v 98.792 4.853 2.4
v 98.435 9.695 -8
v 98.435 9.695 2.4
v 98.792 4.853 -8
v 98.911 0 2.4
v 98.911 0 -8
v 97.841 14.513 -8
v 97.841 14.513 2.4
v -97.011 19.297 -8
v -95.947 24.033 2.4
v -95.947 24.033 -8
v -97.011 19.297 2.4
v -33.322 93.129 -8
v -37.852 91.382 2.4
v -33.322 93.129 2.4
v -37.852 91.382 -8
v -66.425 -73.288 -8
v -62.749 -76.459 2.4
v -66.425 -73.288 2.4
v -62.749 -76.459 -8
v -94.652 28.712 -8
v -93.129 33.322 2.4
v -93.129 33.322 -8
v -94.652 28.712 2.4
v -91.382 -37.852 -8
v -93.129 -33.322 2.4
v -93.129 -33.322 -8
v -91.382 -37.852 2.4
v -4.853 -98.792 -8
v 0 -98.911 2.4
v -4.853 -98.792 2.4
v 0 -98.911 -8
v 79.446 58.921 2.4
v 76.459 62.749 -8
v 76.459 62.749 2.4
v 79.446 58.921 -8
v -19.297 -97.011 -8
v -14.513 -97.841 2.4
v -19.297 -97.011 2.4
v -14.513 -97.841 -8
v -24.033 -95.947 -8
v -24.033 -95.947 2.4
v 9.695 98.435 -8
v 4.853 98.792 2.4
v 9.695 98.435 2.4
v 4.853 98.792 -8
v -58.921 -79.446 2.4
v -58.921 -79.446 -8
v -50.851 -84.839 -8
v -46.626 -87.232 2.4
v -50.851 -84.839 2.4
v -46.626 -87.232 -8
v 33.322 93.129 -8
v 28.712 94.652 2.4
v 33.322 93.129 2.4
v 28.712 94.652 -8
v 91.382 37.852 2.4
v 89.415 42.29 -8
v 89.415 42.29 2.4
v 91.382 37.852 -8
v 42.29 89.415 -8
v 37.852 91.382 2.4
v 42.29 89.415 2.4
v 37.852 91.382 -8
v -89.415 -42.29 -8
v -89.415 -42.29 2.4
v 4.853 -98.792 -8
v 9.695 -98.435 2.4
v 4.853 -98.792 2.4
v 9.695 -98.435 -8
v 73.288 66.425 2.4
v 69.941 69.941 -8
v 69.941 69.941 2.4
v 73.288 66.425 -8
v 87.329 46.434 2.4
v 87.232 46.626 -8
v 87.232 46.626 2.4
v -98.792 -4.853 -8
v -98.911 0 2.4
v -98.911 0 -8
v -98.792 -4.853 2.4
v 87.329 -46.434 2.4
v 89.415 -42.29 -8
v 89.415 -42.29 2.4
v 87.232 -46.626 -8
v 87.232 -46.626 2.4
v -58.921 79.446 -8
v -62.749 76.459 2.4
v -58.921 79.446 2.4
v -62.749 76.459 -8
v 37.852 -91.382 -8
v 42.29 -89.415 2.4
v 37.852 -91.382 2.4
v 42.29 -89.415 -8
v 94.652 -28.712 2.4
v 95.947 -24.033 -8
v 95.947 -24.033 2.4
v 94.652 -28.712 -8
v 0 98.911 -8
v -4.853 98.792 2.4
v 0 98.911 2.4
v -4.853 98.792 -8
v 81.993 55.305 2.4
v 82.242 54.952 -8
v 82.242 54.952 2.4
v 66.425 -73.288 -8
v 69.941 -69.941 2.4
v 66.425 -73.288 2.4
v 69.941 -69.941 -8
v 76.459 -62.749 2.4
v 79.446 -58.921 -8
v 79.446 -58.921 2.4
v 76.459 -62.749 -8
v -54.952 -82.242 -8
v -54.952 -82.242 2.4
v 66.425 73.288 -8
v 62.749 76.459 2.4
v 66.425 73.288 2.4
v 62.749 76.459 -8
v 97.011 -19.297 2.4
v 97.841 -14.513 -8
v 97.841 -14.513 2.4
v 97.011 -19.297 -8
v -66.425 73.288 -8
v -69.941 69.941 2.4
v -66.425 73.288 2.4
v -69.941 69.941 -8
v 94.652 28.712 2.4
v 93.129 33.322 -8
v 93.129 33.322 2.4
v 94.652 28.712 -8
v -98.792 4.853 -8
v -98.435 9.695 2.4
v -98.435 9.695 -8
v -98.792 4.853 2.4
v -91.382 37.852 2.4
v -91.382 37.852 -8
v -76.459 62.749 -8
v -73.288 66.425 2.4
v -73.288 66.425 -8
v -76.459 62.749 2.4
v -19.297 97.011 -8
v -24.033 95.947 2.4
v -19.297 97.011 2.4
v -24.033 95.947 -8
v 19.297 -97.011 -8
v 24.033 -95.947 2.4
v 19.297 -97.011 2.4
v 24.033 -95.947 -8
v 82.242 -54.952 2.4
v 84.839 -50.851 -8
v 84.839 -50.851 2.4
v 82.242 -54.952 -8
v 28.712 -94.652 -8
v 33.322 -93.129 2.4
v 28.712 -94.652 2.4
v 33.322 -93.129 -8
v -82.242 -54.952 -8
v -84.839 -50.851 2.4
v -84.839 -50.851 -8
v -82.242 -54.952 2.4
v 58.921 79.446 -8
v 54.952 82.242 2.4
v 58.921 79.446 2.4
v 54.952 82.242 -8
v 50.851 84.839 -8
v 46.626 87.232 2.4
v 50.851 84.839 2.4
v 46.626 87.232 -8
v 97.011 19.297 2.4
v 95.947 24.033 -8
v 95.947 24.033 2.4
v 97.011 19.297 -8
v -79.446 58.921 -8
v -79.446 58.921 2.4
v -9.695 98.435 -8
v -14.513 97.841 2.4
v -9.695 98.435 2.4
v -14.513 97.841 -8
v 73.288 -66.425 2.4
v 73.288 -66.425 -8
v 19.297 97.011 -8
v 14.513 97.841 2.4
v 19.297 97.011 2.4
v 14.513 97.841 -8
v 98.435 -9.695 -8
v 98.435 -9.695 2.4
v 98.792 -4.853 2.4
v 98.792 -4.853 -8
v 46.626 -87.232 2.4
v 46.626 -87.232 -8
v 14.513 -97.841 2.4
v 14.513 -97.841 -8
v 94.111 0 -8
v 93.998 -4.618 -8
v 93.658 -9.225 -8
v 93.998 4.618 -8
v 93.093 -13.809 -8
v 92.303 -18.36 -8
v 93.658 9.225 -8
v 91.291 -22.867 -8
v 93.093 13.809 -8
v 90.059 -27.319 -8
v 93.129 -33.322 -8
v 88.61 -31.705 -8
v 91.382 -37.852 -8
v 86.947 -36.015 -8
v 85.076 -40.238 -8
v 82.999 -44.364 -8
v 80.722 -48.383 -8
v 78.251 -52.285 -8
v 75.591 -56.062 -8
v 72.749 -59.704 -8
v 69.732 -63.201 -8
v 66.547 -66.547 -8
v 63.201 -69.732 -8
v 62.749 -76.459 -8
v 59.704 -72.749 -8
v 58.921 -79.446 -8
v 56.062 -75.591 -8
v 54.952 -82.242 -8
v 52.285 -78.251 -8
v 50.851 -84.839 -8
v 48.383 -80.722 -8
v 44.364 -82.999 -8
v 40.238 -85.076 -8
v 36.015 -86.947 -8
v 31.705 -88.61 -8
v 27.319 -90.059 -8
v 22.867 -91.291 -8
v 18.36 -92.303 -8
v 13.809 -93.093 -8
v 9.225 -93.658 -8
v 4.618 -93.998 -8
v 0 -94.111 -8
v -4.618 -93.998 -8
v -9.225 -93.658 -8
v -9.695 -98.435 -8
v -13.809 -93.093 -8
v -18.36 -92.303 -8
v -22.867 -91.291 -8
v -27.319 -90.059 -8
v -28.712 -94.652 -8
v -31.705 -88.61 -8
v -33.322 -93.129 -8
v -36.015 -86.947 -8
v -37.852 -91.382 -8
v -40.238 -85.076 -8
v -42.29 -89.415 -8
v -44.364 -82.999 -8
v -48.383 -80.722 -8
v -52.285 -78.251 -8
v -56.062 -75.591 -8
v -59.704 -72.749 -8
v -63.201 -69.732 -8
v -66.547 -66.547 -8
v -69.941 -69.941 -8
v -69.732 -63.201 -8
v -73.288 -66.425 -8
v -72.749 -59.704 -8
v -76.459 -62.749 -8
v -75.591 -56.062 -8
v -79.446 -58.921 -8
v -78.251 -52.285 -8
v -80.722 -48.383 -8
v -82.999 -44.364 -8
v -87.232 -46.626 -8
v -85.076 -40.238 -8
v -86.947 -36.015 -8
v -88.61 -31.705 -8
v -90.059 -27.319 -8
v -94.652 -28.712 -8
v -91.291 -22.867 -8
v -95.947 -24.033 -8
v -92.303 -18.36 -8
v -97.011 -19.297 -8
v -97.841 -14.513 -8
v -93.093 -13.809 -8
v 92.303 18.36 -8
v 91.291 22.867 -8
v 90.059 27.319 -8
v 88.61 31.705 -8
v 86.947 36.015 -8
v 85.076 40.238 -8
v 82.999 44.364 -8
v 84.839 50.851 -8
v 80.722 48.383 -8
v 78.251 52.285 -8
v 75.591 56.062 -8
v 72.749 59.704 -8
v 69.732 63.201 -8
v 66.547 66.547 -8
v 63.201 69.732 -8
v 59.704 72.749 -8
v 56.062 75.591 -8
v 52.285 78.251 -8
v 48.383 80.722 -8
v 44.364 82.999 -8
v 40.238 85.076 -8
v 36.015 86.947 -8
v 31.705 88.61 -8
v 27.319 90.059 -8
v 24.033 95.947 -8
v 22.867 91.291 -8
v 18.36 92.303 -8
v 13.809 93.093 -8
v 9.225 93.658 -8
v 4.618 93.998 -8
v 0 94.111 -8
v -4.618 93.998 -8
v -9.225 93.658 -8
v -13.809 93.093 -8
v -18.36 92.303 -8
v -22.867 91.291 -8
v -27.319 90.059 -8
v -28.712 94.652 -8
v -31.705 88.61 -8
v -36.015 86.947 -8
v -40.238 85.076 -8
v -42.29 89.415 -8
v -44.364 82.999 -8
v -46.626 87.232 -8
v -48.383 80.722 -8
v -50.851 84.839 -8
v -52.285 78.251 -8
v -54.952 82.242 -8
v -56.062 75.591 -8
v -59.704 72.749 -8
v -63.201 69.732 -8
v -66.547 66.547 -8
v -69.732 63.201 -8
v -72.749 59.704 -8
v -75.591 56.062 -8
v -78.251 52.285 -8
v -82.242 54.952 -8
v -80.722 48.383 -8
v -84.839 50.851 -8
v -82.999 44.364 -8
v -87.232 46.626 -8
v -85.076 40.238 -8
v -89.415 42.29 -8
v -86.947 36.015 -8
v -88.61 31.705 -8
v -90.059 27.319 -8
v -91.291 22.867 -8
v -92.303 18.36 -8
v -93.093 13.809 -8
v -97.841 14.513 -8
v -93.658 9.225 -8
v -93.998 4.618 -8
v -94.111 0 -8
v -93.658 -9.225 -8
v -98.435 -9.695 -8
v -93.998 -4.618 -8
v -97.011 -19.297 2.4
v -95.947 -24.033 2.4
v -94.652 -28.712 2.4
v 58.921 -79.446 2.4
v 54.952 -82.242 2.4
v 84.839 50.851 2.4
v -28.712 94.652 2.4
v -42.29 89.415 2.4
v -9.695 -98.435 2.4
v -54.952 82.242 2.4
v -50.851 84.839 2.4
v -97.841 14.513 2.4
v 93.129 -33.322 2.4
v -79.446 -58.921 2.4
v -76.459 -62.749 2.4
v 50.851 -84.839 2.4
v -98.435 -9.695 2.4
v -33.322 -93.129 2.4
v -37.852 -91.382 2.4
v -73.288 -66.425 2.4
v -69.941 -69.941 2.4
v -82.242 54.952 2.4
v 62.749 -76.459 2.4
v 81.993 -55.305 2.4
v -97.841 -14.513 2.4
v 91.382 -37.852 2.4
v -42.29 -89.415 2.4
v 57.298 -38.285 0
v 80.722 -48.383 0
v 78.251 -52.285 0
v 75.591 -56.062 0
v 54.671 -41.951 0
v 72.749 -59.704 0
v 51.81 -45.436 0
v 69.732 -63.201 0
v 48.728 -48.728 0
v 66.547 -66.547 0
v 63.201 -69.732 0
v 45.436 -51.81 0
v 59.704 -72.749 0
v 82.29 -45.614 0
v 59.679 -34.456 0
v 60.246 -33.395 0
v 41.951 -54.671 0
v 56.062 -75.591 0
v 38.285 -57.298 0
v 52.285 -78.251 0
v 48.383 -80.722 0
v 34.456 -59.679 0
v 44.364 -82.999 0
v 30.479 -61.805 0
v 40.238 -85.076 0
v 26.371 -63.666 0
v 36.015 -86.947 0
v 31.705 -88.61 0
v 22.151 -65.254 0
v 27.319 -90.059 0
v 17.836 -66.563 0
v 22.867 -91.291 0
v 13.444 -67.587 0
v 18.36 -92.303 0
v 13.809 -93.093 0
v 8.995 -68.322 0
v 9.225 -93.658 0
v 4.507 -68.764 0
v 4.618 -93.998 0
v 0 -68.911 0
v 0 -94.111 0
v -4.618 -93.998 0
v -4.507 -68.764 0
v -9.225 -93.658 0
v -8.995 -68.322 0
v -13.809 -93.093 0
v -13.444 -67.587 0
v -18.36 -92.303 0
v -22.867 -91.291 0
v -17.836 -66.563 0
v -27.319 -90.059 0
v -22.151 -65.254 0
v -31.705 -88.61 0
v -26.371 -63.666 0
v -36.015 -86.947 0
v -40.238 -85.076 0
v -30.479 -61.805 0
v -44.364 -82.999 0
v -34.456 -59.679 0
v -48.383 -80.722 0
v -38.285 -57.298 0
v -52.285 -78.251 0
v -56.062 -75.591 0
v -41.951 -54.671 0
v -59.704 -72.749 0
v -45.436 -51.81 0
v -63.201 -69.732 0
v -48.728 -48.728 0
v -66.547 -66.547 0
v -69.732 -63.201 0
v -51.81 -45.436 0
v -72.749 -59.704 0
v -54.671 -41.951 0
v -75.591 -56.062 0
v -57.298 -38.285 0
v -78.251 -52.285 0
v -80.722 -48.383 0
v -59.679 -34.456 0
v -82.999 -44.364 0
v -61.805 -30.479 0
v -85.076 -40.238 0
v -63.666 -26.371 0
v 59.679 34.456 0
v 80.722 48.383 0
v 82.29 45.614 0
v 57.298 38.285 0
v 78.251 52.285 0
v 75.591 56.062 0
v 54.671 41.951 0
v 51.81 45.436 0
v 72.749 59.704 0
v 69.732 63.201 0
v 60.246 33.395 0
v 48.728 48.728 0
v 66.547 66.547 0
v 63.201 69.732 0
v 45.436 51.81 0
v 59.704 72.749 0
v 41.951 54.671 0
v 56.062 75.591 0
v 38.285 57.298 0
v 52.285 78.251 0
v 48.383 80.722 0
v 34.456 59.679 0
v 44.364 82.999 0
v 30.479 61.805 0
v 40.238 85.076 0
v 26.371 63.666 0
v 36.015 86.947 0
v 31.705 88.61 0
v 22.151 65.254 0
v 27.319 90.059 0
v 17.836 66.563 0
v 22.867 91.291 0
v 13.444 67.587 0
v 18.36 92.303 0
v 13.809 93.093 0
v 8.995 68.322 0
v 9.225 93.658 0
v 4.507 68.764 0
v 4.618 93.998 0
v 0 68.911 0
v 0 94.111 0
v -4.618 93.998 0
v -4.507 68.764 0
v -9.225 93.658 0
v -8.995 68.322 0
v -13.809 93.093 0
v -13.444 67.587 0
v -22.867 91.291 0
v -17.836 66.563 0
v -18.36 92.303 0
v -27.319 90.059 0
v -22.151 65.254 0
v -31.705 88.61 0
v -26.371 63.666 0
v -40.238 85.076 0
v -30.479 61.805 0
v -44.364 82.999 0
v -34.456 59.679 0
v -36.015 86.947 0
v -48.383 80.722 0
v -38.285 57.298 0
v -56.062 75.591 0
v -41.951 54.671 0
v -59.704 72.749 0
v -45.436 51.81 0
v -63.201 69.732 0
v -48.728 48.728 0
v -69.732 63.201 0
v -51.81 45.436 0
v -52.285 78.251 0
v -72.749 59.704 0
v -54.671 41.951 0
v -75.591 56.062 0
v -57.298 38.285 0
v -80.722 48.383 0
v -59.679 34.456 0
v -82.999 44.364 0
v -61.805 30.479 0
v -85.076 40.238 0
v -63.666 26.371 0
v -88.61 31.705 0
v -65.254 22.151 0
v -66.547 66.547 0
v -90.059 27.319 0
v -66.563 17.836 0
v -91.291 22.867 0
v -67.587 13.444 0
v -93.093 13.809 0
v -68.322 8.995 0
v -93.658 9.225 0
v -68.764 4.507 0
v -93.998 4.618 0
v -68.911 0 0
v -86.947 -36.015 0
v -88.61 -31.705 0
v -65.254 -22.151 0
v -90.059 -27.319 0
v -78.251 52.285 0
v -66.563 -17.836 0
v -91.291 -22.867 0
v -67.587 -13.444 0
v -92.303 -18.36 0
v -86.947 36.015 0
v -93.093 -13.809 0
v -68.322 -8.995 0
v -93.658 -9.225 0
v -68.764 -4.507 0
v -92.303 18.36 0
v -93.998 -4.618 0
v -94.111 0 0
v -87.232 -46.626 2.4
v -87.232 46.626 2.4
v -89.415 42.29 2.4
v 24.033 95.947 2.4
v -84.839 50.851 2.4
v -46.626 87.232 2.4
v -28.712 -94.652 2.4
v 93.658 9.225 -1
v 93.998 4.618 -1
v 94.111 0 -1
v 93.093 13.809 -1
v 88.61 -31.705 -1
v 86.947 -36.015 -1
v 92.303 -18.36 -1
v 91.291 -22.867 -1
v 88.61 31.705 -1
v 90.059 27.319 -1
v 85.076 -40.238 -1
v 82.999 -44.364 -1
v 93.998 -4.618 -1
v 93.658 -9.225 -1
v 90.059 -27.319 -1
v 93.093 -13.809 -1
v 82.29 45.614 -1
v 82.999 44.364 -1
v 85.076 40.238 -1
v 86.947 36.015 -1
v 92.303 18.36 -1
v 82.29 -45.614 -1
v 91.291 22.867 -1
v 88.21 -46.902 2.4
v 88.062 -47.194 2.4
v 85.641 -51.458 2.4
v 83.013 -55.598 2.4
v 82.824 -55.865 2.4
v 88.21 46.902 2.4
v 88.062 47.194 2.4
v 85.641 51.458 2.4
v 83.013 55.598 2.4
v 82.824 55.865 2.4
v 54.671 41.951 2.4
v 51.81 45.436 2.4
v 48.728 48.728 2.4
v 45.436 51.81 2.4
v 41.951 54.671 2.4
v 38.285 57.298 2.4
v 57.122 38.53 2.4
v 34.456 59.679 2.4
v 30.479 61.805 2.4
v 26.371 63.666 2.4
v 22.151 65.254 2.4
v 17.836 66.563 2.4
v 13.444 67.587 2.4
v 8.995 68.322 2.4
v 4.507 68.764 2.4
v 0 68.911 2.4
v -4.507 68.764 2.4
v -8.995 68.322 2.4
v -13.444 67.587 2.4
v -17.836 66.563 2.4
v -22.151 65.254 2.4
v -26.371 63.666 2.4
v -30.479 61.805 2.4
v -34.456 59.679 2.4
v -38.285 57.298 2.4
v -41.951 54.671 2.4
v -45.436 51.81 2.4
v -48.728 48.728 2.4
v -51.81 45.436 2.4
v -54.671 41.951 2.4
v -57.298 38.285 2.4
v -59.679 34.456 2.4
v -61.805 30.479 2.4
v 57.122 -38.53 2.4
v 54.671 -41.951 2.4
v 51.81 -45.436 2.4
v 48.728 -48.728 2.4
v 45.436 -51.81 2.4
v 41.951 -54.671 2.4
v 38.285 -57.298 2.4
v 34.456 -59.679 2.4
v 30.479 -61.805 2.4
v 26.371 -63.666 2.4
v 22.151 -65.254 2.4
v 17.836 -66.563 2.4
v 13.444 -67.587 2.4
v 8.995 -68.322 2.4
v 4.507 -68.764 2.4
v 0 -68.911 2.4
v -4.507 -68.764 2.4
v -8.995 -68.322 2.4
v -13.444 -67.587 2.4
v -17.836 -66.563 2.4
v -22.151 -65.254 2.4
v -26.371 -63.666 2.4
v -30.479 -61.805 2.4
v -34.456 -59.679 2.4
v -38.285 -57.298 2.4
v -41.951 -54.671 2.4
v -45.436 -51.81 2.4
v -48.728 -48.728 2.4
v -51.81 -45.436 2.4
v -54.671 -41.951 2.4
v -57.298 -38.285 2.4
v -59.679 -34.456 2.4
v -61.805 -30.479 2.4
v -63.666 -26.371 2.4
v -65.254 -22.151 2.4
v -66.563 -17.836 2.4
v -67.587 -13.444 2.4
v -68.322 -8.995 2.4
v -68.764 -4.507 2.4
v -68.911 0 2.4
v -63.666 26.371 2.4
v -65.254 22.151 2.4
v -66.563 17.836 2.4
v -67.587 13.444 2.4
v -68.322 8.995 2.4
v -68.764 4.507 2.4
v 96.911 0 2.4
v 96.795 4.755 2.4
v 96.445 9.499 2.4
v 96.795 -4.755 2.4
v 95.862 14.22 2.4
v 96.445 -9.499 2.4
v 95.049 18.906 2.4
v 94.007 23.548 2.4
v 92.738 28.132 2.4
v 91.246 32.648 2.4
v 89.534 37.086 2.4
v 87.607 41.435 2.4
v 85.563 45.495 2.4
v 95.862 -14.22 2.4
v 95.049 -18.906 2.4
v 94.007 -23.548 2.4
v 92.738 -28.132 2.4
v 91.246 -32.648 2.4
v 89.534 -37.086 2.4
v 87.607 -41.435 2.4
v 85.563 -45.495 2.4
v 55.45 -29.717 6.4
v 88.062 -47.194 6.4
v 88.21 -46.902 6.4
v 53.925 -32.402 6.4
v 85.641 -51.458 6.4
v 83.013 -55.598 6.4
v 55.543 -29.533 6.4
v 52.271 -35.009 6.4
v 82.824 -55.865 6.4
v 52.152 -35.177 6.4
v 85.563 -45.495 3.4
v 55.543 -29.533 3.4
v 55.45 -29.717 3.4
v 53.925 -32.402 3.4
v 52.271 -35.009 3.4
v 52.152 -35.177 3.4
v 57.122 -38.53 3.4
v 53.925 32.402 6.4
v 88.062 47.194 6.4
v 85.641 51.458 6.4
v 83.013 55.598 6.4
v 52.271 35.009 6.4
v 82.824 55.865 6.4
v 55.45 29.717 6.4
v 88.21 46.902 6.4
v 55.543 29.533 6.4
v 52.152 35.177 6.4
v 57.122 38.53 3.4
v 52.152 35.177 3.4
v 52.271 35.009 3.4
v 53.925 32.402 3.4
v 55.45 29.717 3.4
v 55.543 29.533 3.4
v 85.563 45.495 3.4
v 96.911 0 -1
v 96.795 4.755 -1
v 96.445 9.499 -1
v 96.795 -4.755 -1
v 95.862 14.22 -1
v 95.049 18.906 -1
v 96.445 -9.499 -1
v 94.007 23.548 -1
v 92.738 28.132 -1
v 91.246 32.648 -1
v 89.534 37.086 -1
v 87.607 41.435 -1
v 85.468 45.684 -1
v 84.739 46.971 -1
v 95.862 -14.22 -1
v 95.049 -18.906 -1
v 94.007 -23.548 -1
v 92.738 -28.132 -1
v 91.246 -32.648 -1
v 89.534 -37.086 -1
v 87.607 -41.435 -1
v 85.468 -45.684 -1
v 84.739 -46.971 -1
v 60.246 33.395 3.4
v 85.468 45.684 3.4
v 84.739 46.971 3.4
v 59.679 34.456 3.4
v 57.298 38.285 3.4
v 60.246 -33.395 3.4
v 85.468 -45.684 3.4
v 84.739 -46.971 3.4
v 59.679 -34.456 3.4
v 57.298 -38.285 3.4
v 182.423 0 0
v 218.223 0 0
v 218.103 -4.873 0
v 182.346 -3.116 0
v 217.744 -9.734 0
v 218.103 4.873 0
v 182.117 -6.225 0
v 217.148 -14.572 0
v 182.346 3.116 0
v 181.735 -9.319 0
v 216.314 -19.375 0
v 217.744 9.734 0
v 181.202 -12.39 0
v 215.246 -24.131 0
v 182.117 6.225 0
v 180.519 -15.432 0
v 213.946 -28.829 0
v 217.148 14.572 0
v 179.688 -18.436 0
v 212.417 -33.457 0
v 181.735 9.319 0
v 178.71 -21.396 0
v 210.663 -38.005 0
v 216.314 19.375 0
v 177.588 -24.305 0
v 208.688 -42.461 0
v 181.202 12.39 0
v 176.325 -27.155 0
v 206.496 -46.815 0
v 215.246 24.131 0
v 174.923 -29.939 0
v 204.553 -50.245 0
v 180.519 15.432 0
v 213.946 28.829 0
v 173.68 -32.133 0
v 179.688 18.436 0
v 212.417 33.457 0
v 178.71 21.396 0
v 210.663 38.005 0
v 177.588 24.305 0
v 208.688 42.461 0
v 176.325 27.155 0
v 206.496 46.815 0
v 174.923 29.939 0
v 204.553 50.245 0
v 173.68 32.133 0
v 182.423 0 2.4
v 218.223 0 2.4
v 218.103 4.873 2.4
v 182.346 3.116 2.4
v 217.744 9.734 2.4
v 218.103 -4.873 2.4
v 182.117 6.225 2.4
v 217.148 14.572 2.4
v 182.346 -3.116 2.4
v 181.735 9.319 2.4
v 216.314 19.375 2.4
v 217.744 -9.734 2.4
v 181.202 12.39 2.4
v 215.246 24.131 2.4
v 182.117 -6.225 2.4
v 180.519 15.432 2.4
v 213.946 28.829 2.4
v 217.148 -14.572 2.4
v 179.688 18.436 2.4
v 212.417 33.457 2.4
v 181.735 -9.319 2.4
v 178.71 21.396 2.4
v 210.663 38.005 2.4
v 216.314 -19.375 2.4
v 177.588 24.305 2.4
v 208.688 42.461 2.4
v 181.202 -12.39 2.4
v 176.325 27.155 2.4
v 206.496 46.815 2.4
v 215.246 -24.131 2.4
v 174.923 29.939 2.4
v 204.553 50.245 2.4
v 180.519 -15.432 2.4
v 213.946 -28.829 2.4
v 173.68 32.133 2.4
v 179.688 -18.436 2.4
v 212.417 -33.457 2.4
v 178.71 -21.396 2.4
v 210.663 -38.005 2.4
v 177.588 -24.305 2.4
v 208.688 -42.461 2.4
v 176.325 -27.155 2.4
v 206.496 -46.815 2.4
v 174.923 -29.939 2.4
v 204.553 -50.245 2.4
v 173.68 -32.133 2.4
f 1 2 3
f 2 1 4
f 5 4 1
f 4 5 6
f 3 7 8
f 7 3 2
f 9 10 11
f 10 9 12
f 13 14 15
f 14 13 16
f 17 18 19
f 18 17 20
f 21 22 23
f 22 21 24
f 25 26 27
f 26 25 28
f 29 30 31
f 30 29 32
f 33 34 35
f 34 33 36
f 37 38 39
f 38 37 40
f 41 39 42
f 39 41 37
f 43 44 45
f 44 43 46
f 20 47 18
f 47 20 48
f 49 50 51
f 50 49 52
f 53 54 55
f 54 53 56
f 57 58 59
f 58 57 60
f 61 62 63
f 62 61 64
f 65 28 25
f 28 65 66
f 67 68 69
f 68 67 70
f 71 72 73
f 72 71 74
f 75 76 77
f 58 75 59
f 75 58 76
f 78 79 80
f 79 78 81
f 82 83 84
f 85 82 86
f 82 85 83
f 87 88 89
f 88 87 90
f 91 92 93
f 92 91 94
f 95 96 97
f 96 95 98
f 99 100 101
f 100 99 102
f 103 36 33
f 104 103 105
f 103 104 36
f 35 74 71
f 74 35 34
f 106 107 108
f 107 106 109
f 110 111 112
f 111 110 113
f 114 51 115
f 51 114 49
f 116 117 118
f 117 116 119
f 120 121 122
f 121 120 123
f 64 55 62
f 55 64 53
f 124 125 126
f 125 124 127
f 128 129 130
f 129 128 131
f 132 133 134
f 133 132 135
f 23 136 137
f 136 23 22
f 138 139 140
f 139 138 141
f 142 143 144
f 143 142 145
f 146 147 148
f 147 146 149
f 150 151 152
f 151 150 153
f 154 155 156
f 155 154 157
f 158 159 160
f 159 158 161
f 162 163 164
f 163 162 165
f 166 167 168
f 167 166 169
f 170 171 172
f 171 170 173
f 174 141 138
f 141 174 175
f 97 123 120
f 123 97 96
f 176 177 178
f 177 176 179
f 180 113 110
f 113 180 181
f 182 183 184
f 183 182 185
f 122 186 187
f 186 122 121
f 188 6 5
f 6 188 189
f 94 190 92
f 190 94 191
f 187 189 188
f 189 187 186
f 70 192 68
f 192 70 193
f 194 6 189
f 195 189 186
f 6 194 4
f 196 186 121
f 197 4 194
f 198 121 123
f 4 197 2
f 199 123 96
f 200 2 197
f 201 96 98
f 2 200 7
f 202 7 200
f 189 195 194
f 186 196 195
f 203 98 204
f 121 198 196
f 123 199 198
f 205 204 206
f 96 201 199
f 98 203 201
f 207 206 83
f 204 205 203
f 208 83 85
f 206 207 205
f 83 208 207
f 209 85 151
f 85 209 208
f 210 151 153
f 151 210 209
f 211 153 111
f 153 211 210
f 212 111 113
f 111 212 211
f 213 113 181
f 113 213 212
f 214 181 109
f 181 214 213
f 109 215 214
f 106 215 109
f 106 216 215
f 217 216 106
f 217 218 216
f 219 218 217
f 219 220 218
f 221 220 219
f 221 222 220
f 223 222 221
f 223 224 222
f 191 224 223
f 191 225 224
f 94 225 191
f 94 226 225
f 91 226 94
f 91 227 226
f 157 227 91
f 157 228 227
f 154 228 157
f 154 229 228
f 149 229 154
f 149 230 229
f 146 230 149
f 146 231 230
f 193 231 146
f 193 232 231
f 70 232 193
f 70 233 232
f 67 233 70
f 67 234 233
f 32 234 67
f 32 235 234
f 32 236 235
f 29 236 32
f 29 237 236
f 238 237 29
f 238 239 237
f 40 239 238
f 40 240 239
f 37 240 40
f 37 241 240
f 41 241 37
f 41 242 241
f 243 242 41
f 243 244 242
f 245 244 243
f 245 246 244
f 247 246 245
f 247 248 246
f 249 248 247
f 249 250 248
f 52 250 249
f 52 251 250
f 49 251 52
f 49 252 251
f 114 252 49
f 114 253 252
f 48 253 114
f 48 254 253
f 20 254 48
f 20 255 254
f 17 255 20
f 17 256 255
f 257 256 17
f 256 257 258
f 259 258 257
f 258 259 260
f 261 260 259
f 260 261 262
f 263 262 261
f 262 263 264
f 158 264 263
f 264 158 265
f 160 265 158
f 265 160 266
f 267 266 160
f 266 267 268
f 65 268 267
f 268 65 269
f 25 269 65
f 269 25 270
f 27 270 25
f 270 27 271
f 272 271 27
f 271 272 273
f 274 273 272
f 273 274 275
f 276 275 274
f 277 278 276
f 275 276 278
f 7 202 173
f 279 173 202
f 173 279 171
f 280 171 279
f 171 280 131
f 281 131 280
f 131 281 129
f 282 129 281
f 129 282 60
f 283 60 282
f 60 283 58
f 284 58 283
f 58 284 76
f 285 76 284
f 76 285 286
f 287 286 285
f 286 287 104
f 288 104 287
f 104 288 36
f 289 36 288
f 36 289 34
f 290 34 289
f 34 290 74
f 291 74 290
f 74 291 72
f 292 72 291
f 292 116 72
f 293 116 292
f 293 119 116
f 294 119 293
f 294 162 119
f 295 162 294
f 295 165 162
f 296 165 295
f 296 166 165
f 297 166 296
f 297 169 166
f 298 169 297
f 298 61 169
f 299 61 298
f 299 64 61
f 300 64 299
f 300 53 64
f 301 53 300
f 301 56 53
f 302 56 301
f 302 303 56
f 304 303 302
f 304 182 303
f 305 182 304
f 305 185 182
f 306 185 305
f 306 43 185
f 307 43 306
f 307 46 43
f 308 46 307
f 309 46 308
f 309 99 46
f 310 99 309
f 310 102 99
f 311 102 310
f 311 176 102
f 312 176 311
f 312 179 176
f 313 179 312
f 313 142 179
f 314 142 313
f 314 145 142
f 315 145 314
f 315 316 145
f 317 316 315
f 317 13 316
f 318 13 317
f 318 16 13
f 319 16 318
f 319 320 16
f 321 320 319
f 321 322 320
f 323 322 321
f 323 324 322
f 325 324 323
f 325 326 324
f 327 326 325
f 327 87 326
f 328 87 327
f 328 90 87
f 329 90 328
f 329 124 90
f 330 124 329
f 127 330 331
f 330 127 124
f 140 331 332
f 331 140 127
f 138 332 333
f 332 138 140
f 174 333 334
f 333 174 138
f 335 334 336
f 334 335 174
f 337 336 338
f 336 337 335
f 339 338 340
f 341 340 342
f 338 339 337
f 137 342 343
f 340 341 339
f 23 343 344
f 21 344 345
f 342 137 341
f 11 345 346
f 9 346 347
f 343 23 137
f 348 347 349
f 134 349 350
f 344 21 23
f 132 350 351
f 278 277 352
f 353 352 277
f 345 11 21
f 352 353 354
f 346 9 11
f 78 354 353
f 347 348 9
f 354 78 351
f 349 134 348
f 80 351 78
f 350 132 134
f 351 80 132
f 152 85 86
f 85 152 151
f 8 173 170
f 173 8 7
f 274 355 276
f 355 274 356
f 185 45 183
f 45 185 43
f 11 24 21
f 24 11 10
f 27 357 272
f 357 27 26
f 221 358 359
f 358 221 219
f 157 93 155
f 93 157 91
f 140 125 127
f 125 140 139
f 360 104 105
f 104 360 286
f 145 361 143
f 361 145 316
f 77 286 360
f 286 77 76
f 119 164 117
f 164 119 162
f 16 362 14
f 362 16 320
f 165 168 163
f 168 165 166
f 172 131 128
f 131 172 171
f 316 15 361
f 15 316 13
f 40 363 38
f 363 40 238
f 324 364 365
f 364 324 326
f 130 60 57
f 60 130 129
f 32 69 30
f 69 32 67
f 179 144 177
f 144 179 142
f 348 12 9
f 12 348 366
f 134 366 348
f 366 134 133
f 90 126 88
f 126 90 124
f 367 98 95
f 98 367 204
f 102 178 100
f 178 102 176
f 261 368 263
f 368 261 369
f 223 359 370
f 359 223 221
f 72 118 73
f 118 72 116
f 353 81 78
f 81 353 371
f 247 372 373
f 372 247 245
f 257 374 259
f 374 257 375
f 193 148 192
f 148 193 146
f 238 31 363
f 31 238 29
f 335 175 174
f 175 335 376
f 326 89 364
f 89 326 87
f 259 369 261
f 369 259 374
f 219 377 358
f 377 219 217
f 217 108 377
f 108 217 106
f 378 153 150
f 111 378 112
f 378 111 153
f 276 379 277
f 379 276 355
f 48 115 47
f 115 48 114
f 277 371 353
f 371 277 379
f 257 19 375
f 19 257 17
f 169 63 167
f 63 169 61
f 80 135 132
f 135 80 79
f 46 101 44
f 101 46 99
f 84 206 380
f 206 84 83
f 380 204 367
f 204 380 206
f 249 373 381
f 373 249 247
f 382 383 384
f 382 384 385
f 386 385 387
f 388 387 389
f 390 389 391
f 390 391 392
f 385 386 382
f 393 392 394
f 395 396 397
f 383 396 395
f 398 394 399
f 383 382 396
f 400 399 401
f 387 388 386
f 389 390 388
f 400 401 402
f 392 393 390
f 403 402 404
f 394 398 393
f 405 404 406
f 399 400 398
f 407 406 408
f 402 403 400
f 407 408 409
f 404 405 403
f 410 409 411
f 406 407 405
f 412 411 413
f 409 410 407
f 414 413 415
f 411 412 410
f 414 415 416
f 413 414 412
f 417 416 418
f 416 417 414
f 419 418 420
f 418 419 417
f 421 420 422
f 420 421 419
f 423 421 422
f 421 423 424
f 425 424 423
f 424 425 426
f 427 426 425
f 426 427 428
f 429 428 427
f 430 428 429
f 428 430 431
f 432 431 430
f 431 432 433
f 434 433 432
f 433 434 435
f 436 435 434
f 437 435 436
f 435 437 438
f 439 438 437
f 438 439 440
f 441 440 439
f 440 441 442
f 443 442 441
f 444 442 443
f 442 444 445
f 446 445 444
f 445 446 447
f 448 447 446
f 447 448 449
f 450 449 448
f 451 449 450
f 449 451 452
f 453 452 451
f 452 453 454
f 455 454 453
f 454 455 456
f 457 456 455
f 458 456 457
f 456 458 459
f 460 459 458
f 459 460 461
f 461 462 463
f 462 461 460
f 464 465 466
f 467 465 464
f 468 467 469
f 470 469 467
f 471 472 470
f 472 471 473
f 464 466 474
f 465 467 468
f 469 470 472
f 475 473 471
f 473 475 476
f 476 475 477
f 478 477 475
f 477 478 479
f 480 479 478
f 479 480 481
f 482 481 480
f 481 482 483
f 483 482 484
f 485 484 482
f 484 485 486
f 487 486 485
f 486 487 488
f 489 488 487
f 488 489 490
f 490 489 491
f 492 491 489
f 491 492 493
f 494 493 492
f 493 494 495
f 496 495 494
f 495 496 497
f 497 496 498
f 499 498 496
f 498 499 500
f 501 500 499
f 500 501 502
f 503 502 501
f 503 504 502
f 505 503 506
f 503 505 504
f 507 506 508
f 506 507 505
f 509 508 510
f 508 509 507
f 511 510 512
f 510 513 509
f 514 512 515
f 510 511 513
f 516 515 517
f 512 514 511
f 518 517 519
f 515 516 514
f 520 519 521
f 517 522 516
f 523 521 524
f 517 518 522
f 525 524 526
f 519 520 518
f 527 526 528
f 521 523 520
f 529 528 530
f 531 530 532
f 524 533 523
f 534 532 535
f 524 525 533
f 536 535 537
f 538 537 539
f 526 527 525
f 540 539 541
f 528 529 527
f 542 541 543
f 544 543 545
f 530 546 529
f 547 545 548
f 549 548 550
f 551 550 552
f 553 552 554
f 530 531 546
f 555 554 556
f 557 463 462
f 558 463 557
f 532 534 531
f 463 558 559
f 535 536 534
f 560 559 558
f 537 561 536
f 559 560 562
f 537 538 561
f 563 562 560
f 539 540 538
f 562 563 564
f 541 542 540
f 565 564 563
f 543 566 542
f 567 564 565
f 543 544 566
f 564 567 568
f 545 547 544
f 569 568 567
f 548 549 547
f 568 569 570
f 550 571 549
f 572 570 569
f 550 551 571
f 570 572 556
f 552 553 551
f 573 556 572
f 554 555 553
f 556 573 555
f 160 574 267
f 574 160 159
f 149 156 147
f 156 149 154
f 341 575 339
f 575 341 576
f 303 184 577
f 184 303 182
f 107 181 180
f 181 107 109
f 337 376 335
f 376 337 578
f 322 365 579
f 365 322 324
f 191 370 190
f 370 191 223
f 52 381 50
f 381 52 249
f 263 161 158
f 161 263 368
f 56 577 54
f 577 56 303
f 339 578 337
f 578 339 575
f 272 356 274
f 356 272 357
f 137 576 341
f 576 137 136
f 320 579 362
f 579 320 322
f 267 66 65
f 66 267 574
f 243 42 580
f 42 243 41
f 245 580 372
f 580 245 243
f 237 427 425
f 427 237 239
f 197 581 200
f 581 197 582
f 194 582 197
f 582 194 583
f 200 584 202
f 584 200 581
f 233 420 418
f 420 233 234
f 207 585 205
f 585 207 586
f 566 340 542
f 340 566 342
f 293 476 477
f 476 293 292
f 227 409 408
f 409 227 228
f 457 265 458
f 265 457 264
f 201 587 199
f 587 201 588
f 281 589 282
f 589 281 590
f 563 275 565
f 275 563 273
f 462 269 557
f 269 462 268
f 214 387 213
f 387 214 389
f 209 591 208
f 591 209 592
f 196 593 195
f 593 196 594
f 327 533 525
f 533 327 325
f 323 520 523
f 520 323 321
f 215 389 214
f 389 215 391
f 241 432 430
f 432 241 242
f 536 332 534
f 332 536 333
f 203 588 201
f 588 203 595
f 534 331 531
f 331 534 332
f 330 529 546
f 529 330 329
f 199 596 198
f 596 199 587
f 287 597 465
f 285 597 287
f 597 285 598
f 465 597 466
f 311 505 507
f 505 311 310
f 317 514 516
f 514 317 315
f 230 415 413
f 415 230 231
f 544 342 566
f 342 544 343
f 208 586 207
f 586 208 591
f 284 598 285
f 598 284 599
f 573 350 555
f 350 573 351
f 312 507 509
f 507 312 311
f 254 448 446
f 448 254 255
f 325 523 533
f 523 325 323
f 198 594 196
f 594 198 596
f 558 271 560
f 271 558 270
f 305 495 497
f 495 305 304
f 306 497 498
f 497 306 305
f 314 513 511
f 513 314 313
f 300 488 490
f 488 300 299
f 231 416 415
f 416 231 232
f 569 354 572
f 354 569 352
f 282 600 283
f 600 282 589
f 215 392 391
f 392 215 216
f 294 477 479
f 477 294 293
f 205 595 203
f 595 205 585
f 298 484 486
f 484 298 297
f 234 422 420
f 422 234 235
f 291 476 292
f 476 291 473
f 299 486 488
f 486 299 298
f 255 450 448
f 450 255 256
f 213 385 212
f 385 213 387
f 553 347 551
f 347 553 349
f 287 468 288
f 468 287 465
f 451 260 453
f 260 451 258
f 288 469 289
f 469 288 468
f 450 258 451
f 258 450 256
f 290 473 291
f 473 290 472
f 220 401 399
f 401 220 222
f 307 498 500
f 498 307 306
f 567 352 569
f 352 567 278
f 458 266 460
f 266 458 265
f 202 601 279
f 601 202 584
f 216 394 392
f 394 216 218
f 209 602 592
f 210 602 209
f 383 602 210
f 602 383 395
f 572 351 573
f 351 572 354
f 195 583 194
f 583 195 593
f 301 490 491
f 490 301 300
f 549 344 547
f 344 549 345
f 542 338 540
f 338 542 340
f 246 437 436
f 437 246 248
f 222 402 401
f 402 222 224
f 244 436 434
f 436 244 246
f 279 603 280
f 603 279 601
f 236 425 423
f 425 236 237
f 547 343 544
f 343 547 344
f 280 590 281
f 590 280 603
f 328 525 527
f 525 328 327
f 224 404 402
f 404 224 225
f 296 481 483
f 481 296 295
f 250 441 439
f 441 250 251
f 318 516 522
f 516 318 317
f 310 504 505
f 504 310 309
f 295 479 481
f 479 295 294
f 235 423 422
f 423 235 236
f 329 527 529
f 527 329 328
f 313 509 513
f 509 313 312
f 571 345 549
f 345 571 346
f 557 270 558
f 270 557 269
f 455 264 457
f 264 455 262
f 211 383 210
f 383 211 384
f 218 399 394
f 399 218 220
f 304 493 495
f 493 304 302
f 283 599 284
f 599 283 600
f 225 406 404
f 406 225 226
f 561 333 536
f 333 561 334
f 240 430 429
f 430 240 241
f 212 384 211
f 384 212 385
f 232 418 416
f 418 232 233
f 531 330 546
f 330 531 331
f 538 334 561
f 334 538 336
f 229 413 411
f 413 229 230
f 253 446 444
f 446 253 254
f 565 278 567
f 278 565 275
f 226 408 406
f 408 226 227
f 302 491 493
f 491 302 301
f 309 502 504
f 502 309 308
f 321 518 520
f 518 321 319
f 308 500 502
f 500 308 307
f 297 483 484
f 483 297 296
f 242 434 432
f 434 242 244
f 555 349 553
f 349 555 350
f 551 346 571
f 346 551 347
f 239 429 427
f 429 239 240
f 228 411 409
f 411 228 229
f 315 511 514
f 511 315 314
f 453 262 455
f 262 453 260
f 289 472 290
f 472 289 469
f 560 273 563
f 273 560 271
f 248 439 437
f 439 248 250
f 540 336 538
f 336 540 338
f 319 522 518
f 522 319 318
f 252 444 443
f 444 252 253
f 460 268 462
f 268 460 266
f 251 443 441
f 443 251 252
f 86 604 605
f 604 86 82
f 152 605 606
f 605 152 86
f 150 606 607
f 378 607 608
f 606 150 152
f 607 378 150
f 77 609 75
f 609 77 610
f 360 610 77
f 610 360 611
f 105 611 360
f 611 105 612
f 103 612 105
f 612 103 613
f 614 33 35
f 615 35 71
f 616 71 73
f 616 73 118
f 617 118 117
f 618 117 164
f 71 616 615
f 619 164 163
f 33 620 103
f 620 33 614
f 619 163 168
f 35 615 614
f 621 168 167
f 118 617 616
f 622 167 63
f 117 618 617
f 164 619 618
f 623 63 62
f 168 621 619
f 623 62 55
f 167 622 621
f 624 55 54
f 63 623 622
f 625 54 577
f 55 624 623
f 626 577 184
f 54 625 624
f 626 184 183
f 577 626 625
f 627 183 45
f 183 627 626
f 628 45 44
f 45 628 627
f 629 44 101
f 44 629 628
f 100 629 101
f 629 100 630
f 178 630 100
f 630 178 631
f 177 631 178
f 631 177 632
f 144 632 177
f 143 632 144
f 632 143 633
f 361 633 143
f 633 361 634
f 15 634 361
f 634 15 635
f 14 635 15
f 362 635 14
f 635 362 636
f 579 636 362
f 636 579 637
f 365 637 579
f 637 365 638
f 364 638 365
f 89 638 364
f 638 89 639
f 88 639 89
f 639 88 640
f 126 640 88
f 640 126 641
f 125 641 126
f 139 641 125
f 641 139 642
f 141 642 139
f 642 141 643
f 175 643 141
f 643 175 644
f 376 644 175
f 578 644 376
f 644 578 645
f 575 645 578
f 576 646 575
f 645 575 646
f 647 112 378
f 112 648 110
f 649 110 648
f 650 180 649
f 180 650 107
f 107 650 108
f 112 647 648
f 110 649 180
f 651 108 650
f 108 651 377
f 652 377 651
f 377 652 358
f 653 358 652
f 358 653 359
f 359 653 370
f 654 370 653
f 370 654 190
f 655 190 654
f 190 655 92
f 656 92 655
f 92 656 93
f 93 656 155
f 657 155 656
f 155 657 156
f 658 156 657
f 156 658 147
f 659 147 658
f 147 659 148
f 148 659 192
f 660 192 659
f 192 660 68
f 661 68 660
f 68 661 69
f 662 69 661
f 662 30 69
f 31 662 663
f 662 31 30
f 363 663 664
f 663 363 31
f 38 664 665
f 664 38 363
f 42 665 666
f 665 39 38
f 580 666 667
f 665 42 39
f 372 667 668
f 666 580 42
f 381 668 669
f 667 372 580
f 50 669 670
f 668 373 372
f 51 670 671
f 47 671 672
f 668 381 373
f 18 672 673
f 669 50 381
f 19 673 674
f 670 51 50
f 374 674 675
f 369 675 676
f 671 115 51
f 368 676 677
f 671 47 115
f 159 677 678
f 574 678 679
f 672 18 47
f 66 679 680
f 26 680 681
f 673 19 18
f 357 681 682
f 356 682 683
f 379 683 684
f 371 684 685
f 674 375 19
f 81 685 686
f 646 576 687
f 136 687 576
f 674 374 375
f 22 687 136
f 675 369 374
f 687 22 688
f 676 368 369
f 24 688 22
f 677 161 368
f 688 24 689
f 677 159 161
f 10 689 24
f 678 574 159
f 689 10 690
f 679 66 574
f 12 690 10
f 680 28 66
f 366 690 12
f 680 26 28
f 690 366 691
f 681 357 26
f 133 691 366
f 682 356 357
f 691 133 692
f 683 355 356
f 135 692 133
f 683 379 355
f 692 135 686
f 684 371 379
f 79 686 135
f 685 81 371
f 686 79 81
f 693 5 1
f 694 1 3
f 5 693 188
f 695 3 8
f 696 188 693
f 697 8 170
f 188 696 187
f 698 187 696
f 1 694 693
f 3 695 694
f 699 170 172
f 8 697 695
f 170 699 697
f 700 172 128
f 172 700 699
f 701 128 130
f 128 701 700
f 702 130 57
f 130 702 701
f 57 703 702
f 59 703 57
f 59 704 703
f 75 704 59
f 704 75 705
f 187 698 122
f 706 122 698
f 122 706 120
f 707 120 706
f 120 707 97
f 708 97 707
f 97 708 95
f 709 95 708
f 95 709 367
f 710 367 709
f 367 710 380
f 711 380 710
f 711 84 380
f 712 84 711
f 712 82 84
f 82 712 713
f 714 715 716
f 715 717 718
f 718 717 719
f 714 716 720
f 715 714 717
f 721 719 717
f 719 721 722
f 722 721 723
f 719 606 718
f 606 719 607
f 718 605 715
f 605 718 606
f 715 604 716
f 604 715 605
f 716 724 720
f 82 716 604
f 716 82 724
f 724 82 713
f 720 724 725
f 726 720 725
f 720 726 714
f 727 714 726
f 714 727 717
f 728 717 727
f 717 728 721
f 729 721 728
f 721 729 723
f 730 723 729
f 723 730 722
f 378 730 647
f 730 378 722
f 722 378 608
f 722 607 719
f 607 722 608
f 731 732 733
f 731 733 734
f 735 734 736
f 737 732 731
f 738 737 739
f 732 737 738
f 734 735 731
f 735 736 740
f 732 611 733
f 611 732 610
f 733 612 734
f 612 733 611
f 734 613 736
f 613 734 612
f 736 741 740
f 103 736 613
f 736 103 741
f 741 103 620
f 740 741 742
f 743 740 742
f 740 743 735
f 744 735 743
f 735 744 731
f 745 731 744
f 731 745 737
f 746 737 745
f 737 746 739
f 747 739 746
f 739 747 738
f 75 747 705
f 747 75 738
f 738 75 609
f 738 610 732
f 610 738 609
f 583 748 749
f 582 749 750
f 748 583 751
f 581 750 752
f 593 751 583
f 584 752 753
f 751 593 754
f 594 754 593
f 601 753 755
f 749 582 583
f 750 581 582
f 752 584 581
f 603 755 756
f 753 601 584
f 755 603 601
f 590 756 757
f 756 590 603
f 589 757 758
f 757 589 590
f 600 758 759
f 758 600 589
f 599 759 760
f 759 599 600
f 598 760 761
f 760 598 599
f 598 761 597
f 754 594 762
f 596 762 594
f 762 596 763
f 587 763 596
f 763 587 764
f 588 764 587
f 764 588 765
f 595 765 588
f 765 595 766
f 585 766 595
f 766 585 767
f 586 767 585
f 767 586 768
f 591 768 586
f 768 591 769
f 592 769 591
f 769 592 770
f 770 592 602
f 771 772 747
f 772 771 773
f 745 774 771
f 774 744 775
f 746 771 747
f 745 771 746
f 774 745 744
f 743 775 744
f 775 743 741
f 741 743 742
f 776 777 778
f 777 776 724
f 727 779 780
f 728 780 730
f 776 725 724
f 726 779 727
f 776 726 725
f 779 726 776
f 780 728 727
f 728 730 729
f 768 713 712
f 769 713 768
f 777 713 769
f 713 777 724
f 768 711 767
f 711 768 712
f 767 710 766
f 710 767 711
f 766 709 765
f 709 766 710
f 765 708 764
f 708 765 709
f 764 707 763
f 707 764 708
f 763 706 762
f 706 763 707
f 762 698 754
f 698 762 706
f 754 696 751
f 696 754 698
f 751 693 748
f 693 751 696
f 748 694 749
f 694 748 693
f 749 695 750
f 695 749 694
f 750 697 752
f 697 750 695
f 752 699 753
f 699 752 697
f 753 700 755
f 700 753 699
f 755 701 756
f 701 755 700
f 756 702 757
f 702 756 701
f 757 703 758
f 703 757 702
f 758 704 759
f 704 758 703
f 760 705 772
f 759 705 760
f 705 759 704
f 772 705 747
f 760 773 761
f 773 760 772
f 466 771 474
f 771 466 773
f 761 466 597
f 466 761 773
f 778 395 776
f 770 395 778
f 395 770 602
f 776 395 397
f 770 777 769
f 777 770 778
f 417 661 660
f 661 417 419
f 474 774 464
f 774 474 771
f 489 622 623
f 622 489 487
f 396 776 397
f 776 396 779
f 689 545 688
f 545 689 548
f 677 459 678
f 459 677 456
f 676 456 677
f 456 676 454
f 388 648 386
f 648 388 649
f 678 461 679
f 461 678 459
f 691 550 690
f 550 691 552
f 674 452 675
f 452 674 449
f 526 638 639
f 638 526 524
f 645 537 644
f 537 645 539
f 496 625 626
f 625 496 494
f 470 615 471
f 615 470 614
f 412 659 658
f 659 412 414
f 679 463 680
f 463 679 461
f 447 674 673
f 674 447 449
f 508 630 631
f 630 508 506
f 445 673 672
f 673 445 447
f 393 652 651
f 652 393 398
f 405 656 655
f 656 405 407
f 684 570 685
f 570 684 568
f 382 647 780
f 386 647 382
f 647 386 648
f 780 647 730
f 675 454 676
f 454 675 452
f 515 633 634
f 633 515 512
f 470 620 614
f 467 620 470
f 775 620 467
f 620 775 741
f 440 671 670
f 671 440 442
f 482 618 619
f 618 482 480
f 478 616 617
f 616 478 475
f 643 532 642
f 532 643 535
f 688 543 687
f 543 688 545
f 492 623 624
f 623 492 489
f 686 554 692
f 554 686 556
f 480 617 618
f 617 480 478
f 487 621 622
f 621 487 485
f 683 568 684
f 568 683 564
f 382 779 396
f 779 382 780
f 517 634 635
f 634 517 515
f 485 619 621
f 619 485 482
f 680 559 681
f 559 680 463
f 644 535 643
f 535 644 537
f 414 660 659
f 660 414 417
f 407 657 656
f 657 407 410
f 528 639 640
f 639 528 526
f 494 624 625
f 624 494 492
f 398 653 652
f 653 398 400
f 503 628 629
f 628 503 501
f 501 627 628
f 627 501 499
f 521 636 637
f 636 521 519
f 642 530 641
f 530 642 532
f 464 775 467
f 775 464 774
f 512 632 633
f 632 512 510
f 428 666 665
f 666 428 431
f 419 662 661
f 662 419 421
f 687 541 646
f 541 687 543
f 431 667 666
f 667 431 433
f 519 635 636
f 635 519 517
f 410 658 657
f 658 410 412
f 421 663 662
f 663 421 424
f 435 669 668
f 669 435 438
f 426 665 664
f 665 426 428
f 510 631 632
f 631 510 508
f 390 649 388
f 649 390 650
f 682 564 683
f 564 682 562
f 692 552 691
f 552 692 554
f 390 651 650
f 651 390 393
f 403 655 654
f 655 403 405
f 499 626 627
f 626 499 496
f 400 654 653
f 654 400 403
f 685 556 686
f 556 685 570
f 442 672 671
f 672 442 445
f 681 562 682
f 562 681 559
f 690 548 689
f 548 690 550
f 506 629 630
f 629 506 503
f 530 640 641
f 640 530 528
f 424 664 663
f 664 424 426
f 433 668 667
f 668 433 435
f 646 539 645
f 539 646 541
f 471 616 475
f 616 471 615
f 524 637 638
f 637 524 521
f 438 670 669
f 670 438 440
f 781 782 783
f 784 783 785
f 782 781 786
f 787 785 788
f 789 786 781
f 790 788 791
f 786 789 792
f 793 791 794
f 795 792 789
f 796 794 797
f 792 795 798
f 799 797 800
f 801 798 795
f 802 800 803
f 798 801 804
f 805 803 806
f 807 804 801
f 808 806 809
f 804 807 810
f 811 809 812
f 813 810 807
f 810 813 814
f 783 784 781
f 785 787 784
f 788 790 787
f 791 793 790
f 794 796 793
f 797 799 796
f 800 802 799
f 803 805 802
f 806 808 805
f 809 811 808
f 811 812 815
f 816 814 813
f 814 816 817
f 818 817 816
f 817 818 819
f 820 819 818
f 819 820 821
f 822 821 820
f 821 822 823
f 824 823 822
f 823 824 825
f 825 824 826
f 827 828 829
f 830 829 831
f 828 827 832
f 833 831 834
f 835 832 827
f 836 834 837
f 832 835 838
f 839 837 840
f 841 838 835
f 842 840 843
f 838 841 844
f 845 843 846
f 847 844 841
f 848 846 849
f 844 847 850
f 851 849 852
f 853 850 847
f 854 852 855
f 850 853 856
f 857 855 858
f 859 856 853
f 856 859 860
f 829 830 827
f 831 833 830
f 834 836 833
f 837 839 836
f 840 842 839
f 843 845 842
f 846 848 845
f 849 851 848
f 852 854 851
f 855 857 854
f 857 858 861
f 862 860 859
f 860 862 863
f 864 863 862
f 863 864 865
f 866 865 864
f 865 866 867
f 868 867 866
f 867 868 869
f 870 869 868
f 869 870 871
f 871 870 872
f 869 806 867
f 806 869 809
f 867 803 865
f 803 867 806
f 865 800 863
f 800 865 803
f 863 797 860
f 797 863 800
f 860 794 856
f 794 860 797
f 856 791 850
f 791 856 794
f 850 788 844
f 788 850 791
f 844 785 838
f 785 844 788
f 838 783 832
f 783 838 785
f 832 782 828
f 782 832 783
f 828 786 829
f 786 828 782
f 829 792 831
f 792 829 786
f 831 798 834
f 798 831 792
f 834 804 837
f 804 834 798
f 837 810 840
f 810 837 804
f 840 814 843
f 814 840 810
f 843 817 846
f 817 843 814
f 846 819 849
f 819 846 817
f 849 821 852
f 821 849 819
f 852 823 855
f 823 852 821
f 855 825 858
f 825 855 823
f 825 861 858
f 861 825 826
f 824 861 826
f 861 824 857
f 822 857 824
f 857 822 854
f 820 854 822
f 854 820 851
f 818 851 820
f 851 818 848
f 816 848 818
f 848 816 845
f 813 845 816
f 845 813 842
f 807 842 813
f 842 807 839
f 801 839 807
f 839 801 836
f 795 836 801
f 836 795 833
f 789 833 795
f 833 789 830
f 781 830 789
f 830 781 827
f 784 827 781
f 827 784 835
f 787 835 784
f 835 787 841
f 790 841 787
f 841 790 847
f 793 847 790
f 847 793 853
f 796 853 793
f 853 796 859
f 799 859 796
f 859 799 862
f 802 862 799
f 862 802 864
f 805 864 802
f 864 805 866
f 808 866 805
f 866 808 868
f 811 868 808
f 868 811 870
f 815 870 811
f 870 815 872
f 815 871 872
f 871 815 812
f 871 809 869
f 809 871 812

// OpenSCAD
// file: helpers.scad
// Shared 2D helpers used by wedge.scad, base.scad and lid.scad.

// Big half-plane (y >= 0), used to build angle masks. `big` just has to be
// larger than any radius used in the design.
module halfplane(big = 2000) {
    translate([-big/2, 0]) square([big, big]);
}

// An angular mask covering [-a/2, +a/2], built as the intersection of two
// half-planes rather than an origin-apex polygon: a sector polygon with its
// point pinned exactly at (0,0) tends to produce a self-touching ("bowtie")
// result once differenced against a same-apex sector for the inner radius,
// which extrudes into a non-manifold solid. Two rotated half-planes never
// share that degenerate vertex.
module angle_mask(a) {
    intersection() {
        rotate([0, 0, -a/2]) halfplane();
        rotate([0, 0, a/2 - 180]) halfplane();
    }
}

// A ring slice between radius r1 and r2, angular width a, centered on angle 0.
module ring_slice(r1, r2, a) {
    intersection() {
        difference() {
            circle(r = r2, $fn = 128);
            circle(r = r1, $fn = 128);
        }
        angle_mask(a);
    }
}
// file: params.scad
// Shared parameters for the whole dispenser — edit these once, every part
// (hub, wedges, base, lid) picks them up via `include`.
// Measure your own packs before printing: hard packs vary a few mm by brand.

slots      = 6;     // number of pockets around the carousel
pack_w     = 55;    // pack width (mm)  - sits tangentially (packs stand upright)
pack_d     = 22;    // pack depth (mm)  - sits radially
pack_h     = 85;    // pack height (mm) - packs stand upright in the pocket
clear      = 3;     // per-side clearance around a pack
wall       = 2.4;   // wall thickness (~6 perimeters at 0.4mm nozzle, PETG)

gap_deg    = 2;                     // angular gap left between neighboring wedges
ang        = 360/slots - gap_deg;   // usable angle per wedge

hub_margin = 6;      // extra radius beyond the strict minimum (wall + boss room)

// r_in is derived, not hand-picked: the tangential width available at r_in
// for one wedge (a chord of angle `ang`) must be >= pack_w + 2*clear, or the
// pack won't fit — sizing this by hand for hub.scad, wedge.scad and base.scad
// separately caused pockets narrower than the pack in an earlier revision.
r_in       = (pack_w + 2*clear) / (2*sin(ang/2)) + hub_margin;
r_out      = r_in + pack_d + clear;

hub_od     = 2 * (r_in - 2);  // hub sits just inside r_in
hub_id     = 8;               // bore for the motor shaft coupler (mm)
hub_height = pack_h + clear + wall;

boss_d     = 6;      // hub attachment boss diameter
boss_hole  = 3.2;    // clearance hole for M3 screw
// main file
// Top lid — print 1x. Covers the carousel so only one pocket at a time is
// reachable, through a fixed loading port with a sliding door. Load packs
// by cycling the carousel (dispense a slot, or use the "load" button in
// Home Assistant, see software/home-assistant) until an empty pocket sits
// under the port, then slide the door open and drop a pack in.
include <params.scad>
include <helpers.scad>

lid_od     = r_out * 2 + 10;   // match base.scad's plate_od
lid_t      = wall;
rim_h      = 8;                // skirt that keeps the lid centered on the base
port_r1    = r_in - clear;
port_r2    = r_out + clear;
door_t     = wall;
rail_gap   = 0.6;              // printed-in-place sliding fit clearance

module lid() {
    difference() {
        union() {
            cylinder(d = lid_od, h = lid_t, $fn = 128);
            // skirt
            translate([0, 0, -rim_h])
                difference() {
                    cylinder(d = lid_od, h = rim_h, $fn = 128);
                    translate([0, 0, -1])
                        cylinder(d = lid_od - wall*4, h = rim_h + 2, $fn = 128);
                }
            // door rails either side of the loading port (angle 0)
            for (s = [-1, 1])
                rotate([0, 0, s * (ang/2 + 2)])
                    translate([0, 0, lid_t])
                        linear_extrude(height = 4)
                            ring_slice(port_r1 - 3, port_r2 + 3, 6);
        }
        // loading port: same sector as one pocket
        translate([0, 0, -1])
            linear_extrude(height = lid_t + 2)
                ring_slice(port_r1, port_r2, ang);
        // center bore, clears the hub + shaft coupler
        translate([0, 0, -rim_h - 1])
            cylinder(d = hub_od + 4, h = rim_h + lid_t + 2, $fn = 96);
    }
}

// Sliding door for the loading port — print separately, slides in the rails.
module door() {
    linear_extrude(height = door_t)
        ring_slice(port_r1 - 3 + rail_gap, port_r2 + 3 - rail_gap, ang + 2*(2 - rail_gap));
}

lid();
translate([lid_od/2 + 20, 0, 0]) door();
